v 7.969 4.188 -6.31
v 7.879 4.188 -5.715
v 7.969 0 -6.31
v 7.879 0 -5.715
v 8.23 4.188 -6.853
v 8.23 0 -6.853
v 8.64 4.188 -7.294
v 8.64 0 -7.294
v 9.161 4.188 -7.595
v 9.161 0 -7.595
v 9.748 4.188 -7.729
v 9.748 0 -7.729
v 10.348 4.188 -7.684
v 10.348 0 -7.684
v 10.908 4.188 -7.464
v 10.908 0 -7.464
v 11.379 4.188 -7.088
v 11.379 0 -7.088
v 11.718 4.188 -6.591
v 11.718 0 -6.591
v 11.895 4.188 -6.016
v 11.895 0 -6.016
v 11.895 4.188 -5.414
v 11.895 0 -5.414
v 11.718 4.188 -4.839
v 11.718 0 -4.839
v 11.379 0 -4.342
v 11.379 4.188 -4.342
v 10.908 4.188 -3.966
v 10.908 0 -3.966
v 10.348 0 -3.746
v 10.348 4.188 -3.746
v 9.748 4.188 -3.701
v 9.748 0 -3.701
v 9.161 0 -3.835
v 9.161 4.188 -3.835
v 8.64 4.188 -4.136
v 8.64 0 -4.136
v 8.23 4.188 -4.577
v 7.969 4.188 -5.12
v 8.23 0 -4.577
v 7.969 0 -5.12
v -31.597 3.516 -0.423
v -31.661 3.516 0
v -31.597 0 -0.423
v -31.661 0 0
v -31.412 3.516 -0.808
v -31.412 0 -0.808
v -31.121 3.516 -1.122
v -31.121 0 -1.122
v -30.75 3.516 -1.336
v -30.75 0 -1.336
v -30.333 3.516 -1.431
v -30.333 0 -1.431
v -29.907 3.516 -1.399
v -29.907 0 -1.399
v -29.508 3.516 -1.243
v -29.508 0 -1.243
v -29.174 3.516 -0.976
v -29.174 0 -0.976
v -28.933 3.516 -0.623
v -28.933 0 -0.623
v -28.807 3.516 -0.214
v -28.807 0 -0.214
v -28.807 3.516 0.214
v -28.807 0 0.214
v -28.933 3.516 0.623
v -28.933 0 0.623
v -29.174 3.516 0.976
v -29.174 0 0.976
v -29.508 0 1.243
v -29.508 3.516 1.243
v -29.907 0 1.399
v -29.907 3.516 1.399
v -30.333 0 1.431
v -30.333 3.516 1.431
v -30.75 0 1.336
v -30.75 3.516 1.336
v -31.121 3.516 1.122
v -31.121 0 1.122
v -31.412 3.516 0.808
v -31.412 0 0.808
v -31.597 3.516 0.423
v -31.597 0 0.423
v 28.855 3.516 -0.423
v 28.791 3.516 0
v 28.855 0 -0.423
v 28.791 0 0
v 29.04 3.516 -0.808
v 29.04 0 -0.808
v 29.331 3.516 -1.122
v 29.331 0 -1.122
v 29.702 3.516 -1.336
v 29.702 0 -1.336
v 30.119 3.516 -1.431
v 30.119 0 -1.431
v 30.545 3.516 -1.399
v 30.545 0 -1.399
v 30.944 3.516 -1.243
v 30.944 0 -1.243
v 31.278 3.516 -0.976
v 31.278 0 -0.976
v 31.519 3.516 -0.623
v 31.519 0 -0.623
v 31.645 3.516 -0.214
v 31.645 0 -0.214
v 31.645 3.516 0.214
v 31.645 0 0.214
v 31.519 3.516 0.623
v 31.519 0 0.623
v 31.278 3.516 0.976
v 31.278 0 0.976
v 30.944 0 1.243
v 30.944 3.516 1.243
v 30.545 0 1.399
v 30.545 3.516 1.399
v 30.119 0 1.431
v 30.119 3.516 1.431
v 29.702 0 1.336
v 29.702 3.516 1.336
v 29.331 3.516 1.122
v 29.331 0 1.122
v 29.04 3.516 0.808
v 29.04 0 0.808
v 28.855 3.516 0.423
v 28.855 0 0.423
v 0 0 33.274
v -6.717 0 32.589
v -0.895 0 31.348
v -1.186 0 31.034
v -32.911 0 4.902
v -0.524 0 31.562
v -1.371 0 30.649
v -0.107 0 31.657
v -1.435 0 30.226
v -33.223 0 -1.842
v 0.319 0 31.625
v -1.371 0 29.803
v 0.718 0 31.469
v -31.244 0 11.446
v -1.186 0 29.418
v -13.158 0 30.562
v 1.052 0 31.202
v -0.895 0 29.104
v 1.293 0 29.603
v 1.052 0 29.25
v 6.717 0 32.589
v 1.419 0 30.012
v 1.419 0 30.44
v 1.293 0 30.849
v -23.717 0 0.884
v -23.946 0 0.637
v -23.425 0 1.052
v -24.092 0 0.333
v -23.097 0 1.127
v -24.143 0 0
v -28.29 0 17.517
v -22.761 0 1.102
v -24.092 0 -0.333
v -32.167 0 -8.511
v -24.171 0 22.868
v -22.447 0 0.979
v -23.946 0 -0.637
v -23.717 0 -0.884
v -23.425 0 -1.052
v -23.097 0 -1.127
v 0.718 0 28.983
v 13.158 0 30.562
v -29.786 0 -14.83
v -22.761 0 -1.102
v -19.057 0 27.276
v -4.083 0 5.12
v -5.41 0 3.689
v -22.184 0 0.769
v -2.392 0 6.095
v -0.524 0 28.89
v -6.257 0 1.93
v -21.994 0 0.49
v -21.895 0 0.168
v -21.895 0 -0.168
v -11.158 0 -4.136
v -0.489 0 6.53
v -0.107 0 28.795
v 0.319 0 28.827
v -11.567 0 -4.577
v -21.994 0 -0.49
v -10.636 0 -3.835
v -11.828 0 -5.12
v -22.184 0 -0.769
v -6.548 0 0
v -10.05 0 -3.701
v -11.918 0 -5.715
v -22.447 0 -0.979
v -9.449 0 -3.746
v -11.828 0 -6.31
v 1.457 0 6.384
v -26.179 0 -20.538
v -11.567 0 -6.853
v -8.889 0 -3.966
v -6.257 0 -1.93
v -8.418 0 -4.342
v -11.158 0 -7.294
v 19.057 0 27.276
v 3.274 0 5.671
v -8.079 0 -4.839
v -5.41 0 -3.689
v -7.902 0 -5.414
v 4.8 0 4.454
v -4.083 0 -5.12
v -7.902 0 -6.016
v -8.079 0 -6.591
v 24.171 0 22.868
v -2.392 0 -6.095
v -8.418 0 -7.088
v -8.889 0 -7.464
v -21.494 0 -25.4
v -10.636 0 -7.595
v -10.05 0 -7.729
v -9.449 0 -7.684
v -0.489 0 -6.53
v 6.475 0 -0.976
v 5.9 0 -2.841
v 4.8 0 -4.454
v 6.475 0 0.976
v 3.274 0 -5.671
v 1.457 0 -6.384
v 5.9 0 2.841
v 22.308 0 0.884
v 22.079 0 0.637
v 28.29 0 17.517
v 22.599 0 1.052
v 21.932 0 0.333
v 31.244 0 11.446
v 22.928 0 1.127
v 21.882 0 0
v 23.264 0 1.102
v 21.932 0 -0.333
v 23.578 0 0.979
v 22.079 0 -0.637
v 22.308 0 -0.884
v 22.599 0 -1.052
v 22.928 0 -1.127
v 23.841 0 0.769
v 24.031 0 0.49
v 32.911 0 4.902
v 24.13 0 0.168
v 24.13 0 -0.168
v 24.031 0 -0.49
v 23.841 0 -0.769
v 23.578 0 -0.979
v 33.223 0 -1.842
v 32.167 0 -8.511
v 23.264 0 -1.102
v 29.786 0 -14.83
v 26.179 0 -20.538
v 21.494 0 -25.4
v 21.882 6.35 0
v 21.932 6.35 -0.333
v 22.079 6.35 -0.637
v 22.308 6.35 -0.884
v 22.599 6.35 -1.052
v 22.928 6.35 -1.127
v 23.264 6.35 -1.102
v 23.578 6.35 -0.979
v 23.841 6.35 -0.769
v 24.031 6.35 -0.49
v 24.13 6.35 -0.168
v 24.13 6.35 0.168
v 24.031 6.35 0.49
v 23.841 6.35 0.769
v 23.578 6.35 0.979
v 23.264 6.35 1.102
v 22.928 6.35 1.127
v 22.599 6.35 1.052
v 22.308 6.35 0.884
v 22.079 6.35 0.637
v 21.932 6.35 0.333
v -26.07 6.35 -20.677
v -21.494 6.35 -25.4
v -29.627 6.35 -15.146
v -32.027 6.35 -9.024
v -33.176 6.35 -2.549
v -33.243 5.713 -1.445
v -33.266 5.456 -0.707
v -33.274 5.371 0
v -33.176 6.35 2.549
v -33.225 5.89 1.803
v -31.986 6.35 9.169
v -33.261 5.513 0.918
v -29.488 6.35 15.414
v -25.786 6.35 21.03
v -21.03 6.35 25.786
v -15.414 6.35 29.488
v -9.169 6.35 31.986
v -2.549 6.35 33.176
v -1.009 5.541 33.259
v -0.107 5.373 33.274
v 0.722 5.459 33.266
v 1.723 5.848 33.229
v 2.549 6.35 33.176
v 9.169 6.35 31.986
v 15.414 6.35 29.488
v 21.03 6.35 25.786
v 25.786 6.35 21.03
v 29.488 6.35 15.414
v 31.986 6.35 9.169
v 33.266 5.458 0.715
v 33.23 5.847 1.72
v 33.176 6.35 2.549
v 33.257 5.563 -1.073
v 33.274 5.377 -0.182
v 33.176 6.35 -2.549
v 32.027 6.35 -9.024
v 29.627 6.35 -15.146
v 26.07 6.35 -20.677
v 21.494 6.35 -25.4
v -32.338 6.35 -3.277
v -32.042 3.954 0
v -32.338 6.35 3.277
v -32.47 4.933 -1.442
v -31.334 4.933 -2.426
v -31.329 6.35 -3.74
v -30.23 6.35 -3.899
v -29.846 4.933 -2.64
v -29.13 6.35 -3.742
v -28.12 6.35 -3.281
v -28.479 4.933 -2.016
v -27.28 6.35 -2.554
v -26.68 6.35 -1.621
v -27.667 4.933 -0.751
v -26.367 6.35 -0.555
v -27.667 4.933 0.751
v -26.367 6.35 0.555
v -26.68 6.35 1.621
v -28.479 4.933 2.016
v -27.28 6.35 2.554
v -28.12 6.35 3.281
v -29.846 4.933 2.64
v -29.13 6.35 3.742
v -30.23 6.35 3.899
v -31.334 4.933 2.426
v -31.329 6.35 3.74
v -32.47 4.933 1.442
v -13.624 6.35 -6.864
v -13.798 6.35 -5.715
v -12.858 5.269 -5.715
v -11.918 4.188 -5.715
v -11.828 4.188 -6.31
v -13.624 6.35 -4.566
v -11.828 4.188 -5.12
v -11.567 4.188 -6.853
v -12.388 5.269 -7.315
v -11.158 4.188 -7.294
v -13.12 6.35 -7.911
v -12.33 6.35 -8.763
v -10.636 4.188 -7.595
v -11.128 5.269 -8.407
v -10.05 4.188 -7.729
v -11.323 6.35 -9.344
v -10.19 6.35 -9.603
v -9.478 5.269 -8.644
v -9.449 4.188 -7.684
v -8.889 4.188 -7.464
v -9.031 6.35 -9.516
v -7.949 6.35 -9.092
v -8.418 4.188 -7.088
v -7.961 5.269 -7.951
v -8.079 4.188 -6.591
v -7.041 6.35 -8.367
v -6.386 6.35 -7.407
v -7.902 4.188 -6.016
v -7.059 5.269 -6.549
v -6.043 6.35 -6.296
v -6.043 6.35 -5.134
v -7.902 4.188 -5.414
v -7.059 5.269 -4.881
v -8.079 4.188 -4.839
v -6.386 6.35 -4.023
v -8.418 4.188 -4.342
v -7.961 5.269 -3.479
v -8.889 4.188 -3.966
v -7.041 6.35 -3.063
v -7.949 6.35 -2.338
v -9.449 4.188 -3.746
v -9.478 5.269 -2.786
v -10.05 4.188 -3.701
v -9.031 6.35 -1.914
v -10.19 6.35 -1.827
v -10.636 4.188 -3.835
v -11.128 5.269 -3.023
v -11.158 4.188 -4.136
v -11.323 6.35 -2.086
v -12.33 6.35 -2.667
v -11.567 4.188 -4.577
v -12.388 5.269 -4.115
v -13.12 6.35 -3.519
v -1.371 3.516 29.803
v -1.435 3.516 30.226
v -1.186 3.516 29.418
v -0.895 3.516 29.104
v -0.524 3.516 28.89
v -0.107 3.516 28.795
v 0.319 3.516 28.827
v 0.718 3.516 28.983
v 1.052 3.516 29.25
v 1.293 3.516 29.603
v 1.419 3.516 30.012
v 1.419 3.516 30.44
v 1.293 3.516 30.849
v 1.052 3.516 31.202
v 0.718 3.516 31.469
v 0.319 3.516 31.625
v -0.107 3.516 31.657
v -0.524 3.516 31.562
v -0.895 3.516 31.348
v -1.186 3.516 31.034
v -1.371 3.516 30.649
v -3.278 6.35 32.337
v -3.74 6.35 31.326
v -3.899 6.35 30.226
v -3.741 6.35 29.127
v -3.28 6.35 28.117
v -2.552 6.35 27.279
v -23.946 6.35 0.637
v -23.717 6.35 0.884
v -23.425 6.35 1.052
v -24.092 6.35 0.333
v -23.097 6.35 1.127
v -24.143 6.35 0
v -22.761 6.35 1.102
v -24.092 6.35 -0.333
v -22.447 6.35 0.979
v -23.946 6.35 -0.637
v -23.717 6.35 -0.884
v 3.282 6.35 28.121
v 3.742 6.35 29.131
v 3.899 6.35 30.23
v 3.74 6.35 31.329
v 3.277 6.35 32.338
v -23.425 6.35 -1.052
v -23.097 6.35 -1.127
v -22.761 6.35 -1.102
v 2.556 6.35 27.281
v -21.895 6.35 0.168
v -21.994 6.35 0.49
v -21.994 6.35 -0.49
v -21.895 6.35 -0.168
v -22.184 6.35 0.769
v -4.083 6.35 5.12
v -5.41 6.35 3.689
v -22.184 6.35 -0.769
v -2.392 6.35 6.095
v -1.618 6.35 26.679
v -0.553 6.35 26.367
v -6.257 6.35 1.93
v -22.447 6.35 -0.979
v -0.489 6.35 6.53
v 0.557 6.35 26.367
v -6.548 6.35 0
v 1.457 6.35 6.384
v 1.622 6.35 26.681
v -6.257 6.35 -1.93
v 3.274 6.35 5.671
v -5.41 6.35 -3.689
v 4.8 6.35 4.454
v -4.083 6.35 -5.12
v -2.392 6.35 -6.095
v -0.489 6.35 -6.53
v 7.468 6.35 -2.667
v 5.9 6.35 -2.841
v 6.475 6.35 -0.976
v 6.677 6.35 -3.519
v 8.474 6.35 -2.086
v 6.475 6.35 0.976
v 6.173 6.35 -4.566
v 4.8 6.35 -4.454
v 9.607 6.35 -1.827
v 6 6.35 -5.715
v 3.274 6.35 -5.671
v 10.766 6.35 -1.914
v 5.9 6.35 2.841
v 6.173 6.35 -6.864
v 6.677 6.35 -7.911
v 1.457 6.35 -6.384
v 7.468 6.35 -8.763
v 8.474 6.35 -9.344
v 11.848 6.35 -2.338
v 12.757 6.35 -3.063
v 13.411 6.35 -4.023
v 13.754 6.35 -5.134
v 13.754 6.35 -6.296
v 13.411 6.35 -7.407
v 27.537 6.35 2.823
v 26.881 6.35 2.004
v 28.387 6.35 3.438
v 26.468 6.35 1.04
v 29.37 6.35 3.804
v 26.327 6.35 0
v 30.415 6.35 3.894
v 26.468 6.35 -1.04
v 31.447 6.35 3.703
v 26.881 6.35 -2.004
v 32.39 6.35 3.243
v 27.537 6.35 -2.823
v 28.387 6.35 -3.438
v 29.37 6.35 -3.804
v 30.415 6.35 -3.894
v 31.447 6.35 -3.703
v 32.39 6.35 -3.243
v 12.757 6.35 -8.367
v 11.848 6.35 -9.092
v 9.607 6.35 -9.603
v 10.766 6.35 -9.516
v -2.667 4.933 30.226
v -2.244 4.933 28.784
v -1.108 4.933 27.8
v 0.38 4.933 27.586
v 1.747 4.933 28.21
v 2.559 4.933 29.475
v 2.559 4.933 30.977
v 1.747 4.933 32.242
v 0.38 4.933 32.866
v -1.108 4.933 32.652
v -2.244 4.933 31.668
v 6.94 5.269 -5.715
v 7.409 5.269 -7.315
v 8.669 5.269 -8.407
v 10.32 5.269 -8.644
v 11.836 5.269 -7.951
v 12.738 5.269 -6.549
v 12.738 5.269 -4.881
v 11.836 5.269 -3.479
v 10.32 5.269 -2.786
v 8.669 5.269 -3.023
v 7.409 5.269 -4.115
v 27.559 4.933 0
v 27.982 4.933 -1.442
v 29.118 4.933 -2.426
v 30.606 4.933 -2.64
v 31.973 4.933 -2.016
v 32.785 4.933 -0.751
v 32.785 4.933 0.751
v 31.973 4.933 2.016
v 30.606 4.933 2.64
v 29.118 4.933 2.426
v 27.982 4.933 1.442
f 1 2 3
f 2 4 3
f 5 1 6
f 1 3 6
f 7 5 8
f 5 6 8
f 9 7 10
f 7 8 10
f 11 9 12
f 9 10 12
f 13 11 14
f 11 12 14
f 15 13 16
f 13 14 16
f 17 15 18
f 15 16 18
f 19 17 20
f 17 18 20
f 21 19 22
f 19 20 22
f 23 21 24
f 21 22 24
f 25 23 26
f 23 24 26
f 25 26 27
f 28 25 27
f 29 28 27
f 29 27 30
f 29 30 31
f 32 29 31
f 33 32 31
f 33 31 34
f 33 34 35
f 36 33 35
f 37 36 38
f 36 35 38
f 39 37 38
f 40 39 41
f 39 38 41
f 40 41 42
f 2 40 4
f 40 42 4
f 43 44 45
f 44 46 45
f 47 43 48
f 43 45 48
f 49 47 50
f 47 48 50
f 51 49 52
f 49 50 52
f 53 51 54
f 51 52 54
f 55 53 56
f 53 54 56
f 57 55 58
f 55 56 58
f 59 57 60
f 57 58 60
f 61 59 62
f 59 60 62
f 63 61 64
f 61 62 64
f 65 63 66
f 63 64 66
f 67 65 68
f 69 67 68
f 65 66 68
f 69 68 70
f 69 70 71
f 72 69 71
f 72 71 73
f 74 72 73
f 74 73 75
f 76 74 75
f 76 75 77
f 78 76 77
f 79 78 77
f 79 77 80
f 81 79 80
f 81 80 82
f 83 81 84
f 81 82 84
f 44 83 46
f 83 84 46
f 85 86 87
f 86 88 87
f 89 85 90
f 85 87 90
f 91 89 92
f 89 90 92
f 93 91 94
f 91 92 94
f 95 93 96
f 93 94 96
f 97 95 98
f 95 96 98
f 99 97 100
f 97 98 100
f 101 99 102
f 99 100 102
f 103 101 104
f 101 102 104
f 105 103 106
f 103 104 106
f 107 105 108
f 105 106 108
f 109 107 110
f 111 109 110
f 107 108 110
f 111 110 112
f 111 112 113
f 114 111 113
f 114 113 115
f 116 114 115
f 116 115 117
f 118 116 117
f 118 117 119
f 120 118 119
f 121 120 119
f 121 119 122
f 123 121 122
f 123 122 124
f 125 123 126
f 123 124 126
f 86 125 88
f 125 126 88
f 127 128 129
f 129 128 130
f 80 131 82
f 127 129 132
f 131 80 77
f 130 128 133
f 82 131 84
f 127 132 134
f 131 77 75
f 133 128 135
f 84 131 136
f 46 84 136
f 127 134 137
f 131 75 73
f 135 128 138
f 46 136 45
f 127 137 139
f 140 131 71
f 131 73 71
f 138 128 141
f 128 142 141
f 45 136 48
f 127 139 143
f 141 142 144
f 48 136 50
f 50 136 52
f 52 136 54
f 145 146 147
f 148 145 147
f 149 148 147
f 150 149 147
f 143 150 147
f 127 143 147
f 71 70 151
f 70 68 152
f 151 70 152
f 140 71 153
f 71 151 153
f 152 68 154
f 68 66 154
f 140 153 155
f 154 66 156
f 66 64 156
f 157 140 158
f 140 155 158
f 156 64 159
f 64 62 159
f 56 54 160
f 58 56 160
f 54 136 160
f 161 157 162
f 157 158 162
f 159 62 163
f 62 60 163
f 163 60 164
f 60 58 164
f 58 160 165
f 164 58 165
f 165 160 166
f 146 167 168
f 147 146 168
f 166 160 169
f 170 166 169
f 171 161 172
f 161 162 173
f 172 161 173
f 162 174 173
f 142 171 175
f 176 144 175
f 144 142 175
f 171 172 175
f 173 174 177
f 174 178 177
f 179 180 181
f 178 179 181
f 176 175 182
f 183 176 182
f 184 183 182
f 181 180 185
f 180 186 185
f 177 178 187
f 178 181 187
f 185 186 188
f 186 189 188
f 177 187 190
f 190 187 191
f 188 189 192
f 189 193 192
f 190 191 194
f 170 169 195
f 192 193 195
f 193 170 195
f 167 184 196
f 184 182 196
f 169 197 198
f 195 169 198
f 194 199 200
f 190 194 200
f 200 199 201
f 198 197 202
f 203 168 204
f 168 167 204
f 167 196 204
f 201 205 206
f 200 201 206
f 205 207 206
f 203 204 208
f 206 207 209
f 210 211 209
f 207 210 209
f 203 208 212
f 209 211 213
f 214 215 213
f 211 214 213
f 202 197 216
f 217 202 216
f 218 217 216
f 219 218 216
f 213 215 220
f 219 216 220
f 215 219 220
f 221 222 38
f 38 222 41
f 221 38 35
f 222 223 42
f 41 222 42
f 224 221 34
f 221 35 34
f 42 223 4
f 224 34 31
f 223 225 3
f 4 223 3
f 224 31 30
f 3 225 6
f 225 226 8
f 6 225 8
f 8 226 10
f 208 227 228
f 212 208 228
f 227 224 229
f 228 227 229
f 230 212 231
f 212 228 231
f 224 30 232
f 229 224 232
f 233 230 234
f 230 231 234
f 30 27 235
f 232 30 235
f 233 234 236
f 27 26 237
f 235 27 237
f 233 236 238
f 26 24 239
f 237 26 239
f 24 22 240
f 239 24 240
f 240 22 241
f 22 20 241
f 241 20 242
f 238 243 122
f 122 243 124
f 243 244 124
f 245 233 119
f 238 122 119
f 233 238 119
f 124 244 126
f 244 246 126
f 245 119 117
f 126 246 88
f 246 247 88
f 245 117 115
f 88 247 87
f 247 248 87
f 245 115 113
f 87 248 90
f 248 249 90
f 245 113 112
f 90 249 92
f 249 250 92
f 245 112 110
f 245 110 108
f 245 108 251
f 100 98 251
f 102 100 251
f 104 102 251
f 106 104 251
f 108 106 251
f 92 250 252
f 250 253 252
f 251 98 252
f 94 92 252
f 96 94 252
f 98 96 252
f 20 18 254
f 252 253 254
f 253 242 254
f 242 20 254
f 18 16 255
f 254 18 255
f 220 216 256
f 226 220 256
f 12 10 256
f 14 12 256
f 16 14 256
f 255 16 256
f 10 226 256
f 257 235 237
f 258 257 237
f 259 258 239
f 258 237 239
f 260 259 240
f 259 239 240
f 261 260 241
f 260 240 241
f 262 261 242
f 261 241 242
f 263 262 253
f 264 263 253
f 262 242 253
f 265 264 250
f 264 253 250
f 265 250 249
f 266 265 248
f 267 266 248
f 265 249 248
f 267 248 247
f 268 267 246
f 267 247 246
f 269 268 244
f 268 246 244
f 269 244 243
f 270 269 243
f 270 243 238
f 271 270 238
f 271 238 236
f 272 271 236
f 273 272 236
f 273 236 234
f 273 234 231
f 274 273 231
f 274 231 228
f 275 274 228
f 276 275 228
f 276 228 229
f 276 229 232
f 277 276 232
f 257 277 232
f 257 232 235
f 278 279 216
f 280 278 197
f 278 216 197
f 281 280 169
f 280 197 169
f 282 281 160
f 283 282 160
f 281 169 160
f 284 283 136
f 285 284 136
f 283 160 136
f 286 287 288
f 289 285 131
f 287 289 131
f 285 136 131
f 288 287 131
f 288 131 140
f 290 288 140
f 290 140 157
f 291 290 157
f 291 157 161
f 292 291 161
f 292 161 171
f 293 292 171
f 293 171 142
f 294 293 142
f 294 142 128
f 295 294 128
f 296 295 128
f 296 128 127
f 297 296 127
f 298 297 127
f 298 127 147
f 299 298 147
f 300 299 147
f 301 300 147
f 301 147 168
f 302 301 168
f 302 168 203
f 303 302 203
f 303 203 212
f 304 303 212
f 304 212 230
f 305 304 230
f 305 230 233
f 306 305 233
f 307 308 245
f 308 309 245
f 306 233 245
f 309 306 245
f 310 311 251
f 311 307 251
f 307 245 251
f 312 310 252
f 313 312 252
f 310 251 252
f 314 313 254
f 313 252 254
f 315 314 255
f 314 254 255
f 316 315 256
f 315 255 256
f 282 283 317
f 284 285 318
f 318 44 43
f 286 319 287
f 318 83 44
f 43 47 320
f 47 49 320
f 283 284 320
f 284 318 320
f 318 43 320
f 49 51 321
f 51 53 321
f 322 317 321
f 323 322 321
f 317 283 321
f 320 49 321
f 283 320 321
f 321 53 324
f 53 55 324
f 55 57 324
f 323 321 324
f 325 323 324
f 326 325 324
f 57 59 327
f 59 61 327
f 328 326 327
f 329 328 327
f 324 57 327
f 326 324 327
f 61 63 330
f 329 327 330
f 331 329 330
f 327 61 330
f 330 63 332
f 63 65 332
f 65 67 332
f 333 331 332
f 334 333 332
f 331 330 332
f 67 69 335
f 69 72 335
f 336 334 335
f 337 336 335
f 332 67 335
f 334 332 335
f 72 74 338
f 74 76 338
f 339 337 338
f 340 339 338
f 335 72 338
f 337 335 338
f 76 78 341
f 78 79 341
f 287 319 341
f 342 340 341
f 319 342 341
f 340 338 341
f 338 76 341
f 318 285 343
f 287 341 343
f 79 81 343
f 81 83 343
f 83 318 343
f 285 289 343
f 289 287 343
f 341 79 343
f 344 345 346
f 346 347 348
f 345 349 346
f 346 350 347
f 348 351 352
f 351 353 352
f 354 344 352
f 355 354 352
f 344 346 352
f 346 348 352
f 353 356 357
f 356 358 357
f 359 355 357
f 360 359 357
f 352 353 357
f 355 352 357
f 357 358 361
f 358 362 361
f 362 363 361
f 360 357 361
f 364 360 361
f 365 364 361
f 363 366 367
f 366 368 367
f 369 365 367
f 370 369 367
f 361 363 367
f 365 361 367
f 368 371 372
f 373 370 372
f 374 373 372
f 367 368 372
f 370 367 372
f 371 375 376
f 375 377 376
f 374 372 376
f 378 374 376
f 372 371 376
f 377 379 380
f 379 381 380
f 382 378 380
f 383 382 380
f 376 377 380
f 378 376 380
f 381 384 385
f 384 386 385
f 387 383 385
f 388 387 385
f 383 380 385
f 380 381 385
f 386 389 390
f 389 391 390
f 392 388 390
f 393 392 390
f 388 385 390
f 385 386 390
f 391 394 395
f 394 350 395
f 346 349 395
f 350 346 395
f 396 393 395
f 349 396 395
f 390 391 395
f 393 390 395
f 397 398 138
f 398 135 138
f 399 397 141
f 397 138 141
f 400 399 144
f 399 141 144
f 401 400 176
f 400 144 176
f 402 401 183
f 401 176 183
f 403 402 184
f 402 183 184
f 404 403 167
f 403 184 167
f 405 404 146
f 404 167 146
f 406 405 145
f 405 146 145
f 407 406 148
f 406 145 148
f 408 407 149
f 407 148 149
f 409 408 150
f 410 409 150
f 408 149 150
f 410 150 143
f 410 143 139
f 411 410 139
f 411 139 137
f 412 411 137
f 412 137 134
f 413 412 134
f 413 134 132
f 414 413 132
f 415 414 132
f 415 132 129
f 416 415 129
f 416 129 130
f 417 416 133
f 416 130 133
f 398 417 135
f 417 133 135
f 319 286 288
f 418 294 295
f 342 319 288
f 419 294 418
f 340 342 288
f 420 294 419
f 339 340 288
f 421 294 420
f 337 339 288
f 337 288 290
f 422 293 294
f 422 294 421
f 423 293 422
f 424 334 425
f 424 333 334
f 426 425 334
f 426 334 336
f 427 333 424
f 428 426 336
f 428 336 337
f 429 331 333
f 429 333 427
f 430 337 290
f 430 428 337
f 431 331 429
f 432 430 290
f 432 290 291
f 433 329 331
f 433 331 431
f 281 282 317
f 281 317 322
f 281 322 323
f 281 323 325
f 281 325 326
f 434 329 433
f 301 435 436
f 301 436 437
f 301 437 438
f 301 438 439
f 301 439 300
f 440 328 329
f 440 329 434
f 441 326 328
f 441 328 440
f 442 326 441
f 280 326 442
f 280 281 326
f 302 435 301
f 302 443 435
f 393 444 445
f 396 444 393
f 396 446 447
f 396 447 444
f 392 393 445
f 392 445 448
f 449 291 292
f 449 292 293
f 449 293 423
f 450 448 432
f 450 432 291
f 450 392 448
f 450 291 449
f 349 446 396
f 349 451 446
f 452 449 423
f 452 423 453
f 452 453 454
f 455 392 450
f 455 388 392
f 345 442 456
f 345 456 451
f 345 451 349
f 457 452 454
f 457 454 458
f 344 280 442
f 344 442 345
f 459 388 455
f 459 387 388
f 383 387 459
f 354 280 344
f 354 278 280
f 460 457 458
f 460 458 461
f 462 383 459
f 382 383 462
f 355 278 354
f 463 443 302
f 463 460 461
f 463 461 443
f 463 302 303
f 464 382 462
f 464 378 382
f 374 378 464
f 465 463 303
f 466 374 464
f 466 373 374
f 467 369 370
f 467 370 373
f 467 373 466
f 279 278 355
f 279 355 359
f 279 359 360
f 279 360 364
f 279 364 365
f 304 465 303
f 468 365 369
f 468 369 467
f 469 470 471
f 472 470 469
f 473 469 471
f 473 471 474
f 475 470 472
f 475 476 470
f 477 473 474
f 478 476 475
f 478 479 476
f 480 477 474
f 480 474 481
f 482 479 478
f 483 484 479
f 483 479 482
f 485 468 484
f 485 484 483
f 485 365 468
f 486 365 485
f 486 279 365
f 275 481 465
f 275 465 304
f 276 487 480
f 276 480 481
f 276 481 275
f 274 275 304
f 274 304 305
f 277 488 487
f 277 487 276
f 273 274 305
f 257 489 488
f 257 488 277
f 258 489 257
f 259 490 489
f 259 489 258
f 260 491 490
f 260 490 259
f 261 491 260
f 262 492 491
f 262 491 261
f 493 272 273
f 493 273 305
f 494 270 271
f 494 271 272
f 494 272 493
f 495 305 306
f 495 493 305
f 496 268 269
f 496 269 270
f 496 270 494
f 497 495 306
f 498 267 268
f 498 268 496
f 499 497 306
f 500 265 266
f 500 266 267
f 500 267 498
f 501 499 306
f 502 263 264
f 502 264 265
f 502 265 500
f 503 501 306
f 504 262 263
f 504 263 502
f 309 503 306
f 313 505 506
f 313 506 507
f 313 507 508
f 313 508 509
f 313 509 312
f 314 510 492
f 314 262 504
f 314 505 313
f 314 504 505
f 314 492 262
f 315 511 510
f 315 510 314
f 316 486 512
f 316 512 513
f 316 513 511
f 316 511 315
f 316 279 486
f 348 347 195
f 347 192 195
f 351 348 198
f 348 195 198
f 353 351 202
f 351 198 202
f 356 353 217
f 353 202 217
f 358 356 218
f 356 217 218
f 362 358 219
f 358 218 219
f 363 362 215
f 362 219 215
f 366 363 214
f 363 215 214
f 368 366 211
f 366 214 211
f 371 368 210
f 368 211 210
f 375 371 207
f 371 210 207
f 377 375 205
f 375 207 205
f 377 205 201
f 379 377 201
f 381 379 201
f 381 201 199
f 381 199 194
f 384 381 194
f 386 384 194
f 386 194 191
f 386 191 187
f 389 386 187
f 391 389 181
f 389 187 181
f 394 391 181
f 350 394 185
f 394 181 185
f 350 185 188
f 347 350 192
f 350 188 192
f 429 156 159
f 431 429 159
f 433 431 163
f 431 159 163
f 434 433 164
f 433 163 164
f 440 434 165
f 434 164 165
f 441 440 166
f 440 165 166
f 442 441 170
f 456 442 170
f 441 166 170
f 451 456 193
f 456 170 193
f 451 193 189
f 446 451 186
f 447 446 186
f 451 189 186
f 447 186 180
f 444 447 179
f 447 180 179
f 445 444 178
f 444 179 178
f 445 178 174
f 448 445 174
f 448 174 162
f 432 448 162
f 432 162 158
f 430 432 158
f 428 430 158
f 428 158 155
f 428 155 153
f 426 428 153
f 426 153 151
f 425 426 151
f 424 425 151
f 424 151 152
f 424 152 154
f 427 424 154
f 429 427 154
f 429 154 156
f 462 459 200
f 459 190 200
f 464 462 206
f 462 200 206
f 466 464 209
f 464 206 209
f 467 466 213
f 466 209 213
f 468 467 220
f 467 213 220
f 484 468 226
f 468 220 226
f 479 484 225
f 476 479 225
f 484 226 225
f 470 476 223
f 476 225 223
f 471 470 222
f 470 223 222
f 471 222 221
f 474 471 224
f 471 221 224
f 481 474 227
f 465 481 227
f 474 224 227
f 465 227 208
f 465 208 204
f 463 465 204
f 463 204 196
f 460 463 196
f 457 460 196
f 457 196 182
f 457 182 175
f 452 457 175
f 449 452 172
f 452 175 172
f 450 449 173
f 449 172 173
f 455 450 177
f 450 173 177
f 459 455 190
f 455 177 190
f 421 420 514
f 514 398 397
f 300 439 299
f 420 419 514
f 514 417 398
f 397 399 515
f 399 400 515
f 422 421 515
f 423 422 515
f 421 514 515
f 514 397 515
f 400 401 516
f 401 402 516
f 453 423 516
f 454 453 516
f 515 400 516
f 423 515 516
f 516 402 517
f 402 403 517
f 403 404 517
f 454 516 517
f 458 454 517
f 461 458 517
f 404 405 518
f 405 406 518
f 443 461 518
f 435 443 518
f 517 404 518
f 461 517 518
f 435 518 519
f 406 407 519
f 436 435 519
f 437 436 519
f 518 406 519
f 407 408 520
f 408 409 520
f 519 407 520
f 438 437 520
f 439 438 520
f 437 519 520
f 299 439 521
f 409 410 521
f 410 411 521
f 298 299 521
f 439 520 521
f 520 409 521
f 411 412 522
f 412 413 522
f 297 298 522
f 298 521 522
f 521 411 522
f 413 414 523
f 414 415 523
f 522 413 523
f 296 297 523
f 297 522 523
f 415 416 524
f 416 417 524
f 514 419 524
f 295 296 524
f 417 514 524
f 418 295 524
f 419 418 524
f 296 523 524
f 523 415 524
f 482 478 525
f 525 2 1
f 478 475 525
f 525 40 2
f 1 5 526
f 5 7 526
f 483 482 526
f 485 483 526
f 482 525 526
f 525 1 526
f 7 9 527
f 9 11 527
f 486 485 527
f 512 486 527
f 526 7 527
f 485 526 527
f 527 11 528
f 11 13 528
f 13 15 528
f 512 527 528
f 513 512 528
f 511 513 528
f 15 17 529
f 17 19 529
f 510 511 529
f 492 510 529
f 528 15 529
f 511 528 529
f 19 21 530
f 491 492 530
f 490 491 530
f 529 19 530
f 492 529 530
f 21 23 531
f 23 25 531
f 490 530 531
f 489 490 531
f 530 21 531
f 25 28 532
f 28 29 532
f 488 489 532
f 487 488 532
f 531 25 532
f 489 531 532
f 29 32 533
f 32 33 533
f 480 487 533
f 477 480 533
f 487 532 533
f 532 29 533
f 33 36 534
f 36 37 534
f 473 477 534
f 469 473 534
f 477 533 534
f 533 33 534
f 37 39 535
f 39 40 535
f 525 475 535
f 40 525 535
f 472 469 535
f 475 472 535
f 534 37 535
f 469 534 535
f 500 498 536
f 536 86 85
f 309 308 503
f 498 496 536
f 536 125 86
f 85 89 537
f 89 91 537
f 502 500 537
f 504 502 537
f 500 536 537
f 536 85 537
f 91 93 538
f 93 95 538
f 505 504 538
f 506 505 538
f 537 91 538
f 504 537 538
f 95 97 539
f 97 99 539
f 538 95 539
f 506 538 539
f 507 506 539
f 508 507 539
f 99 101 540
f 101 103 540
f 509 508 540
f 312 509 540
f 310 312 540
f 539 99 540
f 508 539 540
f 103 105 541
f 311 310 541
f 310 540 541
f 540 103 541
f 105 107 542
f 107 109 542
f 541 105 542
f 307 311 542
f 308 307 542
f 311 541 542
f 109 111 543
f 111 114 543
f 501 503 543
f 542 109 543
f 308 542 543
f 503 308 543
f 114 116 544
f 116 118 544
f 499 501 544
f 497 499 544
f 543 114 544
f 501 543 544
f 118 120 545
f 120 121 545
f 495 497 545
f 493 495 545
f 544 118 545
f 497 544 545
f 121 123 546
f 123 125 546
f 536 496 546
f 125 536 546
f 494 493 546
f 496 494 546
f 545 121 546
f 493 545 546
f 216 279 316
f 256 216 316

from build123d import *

# Parameters (mm, degrees)
SKETCH1_R                    = 33.274
BOSS_EXTRUDE1_DEPTH          = 6.35
PLATEMTGSCREW_D              = 2.8702
PLATEMTGSCREW_DEPTH          = 10.1854
PLATEMTGSCREW_CSINK_D        = 7.7978
PLATEMTGSCREW_CSINK_ANGLE    = 82
PLATEMTGSCREW_TIP            = 0.862295074
ENCODERMTGHOLES_D            = 2.2606
SLIPRGSHFTCLR_D              = 13.09624
SLIPRGSHFTCLR_DEPTH          = 6.35
SLIPRGSHFTCLR_TIP            = 3.934507437
ADDITIONAL_HOLES_D           = 4.0386
ADDITIONAL_HOLES_CSINK_D     = 7.7978
ADDITIONAL_HOLES_CSINK_ANGLE = 82
CUT_EXTRUDE1_DEPTH           = 7.3500001


with BuildPart() as part:
    # Sketch1 → Boss-Extrude1 (new body)
    with BuildSketch(Plane(origin=(0, 0, 0), x_dir=(1, 0, 0), z_dir=(0, 1, 0))):
        Circle(SKETCH1_R)
    extrude(amount=BOSS_EXTRUDE1_DEPTH)

    # PlateMtgScrew
    with Locations(Plane(origin=(0, 6.35, 0), x_dir=(1, 0, 0), z_dir=(0, 1, 0))):
        with Locations((30.226, 0), (-30.226, 0), (0, -30.226)):
            CounterSinkHole(PLATEMTGSCREW_D / 2, PLATEMTGSCREW_CSINK_D / 2, depth=PLATEMTGSCREW_DEPTH, counter_sink_angle=PLATEMTGSCREW_CSINK_ANGLE)
            with Locations((0, 0, -(PLATEMTGSCREW_DEPTH + PLATEMTGSCREW_TIP / 2))):  # 118° drill point
                Cone(0, PLATEMTGSCREW_D / 2, PLATEMTGSCREW_TIP, mode=Mode.SUBTRACT)

    # EncoderMtgHoles (through all)
    with Locations(Plane(origin=(0, 6.35, 0), x_dir=(1, 0, 0), z_dir=(0, 1, 0))):
        with Locations((23.0124, 0), (-23.0124, 0)):
            Hole(ENCODERMTGHOLES_D / 2)

    # SlipRgShftClr
    with Locations(Plane(origin=(0, 6.35, 0), x_dir=(1, 0, 0), z_dir=(0, 1, 0))):
        with Locations((0, 0)):
            Hole(SLIPRGSHFTCLR_D / 2, depth=SLIPRGSHFTCLR_DEPTH)
            with Locations((0, 0, -(SLIPRGSHFTCLR_DEPTH + SLIPRGSHFTCLR_TIP / 2))):  # 118° drill point
                Cone(0, SLIPRGSHFTCLR_D / 2, SLIPRGSHFTCLR_TIP, mode=Mode.SUBTRACT)

    # Additional Holes (through all)
    with Locations(Plane(origin=(0, 6.35, 0), x_dir=(1, 0, 0), z_dir=(0, 1, 0))):
        with Locations((-9.898670365, 5.715), (9.898670365, 5.715)):
            CounterSinkHole(ADDITIONAL_HOLES_D / 2, ADDITIONAL_HOLES_CSINK_D / 2, counter_sink_angle=ADDITIONAL_HOLES_CSINK_ANGLE)

    # Sketch16 → Cut-Extrude1 (cut, through all)
    with BuildSketch(Plane(origin=(0, 6.35, 0), x_dir=(1, 0, 0), z_dir=(0, 1, 0))):
        Polygon((-192.02067324, 25.4), (-21.494163766, 25.4), (21.494163766, 25.4), (192.02067324, 25.4), (192.02067324, 366.453018948), (-192.02067324, 366.453018948), align=None)
    extrude(amount=-CUT_EXTRUDE1_DEPTH, mode=Mode.SUBTRACT)


solid = part.part
